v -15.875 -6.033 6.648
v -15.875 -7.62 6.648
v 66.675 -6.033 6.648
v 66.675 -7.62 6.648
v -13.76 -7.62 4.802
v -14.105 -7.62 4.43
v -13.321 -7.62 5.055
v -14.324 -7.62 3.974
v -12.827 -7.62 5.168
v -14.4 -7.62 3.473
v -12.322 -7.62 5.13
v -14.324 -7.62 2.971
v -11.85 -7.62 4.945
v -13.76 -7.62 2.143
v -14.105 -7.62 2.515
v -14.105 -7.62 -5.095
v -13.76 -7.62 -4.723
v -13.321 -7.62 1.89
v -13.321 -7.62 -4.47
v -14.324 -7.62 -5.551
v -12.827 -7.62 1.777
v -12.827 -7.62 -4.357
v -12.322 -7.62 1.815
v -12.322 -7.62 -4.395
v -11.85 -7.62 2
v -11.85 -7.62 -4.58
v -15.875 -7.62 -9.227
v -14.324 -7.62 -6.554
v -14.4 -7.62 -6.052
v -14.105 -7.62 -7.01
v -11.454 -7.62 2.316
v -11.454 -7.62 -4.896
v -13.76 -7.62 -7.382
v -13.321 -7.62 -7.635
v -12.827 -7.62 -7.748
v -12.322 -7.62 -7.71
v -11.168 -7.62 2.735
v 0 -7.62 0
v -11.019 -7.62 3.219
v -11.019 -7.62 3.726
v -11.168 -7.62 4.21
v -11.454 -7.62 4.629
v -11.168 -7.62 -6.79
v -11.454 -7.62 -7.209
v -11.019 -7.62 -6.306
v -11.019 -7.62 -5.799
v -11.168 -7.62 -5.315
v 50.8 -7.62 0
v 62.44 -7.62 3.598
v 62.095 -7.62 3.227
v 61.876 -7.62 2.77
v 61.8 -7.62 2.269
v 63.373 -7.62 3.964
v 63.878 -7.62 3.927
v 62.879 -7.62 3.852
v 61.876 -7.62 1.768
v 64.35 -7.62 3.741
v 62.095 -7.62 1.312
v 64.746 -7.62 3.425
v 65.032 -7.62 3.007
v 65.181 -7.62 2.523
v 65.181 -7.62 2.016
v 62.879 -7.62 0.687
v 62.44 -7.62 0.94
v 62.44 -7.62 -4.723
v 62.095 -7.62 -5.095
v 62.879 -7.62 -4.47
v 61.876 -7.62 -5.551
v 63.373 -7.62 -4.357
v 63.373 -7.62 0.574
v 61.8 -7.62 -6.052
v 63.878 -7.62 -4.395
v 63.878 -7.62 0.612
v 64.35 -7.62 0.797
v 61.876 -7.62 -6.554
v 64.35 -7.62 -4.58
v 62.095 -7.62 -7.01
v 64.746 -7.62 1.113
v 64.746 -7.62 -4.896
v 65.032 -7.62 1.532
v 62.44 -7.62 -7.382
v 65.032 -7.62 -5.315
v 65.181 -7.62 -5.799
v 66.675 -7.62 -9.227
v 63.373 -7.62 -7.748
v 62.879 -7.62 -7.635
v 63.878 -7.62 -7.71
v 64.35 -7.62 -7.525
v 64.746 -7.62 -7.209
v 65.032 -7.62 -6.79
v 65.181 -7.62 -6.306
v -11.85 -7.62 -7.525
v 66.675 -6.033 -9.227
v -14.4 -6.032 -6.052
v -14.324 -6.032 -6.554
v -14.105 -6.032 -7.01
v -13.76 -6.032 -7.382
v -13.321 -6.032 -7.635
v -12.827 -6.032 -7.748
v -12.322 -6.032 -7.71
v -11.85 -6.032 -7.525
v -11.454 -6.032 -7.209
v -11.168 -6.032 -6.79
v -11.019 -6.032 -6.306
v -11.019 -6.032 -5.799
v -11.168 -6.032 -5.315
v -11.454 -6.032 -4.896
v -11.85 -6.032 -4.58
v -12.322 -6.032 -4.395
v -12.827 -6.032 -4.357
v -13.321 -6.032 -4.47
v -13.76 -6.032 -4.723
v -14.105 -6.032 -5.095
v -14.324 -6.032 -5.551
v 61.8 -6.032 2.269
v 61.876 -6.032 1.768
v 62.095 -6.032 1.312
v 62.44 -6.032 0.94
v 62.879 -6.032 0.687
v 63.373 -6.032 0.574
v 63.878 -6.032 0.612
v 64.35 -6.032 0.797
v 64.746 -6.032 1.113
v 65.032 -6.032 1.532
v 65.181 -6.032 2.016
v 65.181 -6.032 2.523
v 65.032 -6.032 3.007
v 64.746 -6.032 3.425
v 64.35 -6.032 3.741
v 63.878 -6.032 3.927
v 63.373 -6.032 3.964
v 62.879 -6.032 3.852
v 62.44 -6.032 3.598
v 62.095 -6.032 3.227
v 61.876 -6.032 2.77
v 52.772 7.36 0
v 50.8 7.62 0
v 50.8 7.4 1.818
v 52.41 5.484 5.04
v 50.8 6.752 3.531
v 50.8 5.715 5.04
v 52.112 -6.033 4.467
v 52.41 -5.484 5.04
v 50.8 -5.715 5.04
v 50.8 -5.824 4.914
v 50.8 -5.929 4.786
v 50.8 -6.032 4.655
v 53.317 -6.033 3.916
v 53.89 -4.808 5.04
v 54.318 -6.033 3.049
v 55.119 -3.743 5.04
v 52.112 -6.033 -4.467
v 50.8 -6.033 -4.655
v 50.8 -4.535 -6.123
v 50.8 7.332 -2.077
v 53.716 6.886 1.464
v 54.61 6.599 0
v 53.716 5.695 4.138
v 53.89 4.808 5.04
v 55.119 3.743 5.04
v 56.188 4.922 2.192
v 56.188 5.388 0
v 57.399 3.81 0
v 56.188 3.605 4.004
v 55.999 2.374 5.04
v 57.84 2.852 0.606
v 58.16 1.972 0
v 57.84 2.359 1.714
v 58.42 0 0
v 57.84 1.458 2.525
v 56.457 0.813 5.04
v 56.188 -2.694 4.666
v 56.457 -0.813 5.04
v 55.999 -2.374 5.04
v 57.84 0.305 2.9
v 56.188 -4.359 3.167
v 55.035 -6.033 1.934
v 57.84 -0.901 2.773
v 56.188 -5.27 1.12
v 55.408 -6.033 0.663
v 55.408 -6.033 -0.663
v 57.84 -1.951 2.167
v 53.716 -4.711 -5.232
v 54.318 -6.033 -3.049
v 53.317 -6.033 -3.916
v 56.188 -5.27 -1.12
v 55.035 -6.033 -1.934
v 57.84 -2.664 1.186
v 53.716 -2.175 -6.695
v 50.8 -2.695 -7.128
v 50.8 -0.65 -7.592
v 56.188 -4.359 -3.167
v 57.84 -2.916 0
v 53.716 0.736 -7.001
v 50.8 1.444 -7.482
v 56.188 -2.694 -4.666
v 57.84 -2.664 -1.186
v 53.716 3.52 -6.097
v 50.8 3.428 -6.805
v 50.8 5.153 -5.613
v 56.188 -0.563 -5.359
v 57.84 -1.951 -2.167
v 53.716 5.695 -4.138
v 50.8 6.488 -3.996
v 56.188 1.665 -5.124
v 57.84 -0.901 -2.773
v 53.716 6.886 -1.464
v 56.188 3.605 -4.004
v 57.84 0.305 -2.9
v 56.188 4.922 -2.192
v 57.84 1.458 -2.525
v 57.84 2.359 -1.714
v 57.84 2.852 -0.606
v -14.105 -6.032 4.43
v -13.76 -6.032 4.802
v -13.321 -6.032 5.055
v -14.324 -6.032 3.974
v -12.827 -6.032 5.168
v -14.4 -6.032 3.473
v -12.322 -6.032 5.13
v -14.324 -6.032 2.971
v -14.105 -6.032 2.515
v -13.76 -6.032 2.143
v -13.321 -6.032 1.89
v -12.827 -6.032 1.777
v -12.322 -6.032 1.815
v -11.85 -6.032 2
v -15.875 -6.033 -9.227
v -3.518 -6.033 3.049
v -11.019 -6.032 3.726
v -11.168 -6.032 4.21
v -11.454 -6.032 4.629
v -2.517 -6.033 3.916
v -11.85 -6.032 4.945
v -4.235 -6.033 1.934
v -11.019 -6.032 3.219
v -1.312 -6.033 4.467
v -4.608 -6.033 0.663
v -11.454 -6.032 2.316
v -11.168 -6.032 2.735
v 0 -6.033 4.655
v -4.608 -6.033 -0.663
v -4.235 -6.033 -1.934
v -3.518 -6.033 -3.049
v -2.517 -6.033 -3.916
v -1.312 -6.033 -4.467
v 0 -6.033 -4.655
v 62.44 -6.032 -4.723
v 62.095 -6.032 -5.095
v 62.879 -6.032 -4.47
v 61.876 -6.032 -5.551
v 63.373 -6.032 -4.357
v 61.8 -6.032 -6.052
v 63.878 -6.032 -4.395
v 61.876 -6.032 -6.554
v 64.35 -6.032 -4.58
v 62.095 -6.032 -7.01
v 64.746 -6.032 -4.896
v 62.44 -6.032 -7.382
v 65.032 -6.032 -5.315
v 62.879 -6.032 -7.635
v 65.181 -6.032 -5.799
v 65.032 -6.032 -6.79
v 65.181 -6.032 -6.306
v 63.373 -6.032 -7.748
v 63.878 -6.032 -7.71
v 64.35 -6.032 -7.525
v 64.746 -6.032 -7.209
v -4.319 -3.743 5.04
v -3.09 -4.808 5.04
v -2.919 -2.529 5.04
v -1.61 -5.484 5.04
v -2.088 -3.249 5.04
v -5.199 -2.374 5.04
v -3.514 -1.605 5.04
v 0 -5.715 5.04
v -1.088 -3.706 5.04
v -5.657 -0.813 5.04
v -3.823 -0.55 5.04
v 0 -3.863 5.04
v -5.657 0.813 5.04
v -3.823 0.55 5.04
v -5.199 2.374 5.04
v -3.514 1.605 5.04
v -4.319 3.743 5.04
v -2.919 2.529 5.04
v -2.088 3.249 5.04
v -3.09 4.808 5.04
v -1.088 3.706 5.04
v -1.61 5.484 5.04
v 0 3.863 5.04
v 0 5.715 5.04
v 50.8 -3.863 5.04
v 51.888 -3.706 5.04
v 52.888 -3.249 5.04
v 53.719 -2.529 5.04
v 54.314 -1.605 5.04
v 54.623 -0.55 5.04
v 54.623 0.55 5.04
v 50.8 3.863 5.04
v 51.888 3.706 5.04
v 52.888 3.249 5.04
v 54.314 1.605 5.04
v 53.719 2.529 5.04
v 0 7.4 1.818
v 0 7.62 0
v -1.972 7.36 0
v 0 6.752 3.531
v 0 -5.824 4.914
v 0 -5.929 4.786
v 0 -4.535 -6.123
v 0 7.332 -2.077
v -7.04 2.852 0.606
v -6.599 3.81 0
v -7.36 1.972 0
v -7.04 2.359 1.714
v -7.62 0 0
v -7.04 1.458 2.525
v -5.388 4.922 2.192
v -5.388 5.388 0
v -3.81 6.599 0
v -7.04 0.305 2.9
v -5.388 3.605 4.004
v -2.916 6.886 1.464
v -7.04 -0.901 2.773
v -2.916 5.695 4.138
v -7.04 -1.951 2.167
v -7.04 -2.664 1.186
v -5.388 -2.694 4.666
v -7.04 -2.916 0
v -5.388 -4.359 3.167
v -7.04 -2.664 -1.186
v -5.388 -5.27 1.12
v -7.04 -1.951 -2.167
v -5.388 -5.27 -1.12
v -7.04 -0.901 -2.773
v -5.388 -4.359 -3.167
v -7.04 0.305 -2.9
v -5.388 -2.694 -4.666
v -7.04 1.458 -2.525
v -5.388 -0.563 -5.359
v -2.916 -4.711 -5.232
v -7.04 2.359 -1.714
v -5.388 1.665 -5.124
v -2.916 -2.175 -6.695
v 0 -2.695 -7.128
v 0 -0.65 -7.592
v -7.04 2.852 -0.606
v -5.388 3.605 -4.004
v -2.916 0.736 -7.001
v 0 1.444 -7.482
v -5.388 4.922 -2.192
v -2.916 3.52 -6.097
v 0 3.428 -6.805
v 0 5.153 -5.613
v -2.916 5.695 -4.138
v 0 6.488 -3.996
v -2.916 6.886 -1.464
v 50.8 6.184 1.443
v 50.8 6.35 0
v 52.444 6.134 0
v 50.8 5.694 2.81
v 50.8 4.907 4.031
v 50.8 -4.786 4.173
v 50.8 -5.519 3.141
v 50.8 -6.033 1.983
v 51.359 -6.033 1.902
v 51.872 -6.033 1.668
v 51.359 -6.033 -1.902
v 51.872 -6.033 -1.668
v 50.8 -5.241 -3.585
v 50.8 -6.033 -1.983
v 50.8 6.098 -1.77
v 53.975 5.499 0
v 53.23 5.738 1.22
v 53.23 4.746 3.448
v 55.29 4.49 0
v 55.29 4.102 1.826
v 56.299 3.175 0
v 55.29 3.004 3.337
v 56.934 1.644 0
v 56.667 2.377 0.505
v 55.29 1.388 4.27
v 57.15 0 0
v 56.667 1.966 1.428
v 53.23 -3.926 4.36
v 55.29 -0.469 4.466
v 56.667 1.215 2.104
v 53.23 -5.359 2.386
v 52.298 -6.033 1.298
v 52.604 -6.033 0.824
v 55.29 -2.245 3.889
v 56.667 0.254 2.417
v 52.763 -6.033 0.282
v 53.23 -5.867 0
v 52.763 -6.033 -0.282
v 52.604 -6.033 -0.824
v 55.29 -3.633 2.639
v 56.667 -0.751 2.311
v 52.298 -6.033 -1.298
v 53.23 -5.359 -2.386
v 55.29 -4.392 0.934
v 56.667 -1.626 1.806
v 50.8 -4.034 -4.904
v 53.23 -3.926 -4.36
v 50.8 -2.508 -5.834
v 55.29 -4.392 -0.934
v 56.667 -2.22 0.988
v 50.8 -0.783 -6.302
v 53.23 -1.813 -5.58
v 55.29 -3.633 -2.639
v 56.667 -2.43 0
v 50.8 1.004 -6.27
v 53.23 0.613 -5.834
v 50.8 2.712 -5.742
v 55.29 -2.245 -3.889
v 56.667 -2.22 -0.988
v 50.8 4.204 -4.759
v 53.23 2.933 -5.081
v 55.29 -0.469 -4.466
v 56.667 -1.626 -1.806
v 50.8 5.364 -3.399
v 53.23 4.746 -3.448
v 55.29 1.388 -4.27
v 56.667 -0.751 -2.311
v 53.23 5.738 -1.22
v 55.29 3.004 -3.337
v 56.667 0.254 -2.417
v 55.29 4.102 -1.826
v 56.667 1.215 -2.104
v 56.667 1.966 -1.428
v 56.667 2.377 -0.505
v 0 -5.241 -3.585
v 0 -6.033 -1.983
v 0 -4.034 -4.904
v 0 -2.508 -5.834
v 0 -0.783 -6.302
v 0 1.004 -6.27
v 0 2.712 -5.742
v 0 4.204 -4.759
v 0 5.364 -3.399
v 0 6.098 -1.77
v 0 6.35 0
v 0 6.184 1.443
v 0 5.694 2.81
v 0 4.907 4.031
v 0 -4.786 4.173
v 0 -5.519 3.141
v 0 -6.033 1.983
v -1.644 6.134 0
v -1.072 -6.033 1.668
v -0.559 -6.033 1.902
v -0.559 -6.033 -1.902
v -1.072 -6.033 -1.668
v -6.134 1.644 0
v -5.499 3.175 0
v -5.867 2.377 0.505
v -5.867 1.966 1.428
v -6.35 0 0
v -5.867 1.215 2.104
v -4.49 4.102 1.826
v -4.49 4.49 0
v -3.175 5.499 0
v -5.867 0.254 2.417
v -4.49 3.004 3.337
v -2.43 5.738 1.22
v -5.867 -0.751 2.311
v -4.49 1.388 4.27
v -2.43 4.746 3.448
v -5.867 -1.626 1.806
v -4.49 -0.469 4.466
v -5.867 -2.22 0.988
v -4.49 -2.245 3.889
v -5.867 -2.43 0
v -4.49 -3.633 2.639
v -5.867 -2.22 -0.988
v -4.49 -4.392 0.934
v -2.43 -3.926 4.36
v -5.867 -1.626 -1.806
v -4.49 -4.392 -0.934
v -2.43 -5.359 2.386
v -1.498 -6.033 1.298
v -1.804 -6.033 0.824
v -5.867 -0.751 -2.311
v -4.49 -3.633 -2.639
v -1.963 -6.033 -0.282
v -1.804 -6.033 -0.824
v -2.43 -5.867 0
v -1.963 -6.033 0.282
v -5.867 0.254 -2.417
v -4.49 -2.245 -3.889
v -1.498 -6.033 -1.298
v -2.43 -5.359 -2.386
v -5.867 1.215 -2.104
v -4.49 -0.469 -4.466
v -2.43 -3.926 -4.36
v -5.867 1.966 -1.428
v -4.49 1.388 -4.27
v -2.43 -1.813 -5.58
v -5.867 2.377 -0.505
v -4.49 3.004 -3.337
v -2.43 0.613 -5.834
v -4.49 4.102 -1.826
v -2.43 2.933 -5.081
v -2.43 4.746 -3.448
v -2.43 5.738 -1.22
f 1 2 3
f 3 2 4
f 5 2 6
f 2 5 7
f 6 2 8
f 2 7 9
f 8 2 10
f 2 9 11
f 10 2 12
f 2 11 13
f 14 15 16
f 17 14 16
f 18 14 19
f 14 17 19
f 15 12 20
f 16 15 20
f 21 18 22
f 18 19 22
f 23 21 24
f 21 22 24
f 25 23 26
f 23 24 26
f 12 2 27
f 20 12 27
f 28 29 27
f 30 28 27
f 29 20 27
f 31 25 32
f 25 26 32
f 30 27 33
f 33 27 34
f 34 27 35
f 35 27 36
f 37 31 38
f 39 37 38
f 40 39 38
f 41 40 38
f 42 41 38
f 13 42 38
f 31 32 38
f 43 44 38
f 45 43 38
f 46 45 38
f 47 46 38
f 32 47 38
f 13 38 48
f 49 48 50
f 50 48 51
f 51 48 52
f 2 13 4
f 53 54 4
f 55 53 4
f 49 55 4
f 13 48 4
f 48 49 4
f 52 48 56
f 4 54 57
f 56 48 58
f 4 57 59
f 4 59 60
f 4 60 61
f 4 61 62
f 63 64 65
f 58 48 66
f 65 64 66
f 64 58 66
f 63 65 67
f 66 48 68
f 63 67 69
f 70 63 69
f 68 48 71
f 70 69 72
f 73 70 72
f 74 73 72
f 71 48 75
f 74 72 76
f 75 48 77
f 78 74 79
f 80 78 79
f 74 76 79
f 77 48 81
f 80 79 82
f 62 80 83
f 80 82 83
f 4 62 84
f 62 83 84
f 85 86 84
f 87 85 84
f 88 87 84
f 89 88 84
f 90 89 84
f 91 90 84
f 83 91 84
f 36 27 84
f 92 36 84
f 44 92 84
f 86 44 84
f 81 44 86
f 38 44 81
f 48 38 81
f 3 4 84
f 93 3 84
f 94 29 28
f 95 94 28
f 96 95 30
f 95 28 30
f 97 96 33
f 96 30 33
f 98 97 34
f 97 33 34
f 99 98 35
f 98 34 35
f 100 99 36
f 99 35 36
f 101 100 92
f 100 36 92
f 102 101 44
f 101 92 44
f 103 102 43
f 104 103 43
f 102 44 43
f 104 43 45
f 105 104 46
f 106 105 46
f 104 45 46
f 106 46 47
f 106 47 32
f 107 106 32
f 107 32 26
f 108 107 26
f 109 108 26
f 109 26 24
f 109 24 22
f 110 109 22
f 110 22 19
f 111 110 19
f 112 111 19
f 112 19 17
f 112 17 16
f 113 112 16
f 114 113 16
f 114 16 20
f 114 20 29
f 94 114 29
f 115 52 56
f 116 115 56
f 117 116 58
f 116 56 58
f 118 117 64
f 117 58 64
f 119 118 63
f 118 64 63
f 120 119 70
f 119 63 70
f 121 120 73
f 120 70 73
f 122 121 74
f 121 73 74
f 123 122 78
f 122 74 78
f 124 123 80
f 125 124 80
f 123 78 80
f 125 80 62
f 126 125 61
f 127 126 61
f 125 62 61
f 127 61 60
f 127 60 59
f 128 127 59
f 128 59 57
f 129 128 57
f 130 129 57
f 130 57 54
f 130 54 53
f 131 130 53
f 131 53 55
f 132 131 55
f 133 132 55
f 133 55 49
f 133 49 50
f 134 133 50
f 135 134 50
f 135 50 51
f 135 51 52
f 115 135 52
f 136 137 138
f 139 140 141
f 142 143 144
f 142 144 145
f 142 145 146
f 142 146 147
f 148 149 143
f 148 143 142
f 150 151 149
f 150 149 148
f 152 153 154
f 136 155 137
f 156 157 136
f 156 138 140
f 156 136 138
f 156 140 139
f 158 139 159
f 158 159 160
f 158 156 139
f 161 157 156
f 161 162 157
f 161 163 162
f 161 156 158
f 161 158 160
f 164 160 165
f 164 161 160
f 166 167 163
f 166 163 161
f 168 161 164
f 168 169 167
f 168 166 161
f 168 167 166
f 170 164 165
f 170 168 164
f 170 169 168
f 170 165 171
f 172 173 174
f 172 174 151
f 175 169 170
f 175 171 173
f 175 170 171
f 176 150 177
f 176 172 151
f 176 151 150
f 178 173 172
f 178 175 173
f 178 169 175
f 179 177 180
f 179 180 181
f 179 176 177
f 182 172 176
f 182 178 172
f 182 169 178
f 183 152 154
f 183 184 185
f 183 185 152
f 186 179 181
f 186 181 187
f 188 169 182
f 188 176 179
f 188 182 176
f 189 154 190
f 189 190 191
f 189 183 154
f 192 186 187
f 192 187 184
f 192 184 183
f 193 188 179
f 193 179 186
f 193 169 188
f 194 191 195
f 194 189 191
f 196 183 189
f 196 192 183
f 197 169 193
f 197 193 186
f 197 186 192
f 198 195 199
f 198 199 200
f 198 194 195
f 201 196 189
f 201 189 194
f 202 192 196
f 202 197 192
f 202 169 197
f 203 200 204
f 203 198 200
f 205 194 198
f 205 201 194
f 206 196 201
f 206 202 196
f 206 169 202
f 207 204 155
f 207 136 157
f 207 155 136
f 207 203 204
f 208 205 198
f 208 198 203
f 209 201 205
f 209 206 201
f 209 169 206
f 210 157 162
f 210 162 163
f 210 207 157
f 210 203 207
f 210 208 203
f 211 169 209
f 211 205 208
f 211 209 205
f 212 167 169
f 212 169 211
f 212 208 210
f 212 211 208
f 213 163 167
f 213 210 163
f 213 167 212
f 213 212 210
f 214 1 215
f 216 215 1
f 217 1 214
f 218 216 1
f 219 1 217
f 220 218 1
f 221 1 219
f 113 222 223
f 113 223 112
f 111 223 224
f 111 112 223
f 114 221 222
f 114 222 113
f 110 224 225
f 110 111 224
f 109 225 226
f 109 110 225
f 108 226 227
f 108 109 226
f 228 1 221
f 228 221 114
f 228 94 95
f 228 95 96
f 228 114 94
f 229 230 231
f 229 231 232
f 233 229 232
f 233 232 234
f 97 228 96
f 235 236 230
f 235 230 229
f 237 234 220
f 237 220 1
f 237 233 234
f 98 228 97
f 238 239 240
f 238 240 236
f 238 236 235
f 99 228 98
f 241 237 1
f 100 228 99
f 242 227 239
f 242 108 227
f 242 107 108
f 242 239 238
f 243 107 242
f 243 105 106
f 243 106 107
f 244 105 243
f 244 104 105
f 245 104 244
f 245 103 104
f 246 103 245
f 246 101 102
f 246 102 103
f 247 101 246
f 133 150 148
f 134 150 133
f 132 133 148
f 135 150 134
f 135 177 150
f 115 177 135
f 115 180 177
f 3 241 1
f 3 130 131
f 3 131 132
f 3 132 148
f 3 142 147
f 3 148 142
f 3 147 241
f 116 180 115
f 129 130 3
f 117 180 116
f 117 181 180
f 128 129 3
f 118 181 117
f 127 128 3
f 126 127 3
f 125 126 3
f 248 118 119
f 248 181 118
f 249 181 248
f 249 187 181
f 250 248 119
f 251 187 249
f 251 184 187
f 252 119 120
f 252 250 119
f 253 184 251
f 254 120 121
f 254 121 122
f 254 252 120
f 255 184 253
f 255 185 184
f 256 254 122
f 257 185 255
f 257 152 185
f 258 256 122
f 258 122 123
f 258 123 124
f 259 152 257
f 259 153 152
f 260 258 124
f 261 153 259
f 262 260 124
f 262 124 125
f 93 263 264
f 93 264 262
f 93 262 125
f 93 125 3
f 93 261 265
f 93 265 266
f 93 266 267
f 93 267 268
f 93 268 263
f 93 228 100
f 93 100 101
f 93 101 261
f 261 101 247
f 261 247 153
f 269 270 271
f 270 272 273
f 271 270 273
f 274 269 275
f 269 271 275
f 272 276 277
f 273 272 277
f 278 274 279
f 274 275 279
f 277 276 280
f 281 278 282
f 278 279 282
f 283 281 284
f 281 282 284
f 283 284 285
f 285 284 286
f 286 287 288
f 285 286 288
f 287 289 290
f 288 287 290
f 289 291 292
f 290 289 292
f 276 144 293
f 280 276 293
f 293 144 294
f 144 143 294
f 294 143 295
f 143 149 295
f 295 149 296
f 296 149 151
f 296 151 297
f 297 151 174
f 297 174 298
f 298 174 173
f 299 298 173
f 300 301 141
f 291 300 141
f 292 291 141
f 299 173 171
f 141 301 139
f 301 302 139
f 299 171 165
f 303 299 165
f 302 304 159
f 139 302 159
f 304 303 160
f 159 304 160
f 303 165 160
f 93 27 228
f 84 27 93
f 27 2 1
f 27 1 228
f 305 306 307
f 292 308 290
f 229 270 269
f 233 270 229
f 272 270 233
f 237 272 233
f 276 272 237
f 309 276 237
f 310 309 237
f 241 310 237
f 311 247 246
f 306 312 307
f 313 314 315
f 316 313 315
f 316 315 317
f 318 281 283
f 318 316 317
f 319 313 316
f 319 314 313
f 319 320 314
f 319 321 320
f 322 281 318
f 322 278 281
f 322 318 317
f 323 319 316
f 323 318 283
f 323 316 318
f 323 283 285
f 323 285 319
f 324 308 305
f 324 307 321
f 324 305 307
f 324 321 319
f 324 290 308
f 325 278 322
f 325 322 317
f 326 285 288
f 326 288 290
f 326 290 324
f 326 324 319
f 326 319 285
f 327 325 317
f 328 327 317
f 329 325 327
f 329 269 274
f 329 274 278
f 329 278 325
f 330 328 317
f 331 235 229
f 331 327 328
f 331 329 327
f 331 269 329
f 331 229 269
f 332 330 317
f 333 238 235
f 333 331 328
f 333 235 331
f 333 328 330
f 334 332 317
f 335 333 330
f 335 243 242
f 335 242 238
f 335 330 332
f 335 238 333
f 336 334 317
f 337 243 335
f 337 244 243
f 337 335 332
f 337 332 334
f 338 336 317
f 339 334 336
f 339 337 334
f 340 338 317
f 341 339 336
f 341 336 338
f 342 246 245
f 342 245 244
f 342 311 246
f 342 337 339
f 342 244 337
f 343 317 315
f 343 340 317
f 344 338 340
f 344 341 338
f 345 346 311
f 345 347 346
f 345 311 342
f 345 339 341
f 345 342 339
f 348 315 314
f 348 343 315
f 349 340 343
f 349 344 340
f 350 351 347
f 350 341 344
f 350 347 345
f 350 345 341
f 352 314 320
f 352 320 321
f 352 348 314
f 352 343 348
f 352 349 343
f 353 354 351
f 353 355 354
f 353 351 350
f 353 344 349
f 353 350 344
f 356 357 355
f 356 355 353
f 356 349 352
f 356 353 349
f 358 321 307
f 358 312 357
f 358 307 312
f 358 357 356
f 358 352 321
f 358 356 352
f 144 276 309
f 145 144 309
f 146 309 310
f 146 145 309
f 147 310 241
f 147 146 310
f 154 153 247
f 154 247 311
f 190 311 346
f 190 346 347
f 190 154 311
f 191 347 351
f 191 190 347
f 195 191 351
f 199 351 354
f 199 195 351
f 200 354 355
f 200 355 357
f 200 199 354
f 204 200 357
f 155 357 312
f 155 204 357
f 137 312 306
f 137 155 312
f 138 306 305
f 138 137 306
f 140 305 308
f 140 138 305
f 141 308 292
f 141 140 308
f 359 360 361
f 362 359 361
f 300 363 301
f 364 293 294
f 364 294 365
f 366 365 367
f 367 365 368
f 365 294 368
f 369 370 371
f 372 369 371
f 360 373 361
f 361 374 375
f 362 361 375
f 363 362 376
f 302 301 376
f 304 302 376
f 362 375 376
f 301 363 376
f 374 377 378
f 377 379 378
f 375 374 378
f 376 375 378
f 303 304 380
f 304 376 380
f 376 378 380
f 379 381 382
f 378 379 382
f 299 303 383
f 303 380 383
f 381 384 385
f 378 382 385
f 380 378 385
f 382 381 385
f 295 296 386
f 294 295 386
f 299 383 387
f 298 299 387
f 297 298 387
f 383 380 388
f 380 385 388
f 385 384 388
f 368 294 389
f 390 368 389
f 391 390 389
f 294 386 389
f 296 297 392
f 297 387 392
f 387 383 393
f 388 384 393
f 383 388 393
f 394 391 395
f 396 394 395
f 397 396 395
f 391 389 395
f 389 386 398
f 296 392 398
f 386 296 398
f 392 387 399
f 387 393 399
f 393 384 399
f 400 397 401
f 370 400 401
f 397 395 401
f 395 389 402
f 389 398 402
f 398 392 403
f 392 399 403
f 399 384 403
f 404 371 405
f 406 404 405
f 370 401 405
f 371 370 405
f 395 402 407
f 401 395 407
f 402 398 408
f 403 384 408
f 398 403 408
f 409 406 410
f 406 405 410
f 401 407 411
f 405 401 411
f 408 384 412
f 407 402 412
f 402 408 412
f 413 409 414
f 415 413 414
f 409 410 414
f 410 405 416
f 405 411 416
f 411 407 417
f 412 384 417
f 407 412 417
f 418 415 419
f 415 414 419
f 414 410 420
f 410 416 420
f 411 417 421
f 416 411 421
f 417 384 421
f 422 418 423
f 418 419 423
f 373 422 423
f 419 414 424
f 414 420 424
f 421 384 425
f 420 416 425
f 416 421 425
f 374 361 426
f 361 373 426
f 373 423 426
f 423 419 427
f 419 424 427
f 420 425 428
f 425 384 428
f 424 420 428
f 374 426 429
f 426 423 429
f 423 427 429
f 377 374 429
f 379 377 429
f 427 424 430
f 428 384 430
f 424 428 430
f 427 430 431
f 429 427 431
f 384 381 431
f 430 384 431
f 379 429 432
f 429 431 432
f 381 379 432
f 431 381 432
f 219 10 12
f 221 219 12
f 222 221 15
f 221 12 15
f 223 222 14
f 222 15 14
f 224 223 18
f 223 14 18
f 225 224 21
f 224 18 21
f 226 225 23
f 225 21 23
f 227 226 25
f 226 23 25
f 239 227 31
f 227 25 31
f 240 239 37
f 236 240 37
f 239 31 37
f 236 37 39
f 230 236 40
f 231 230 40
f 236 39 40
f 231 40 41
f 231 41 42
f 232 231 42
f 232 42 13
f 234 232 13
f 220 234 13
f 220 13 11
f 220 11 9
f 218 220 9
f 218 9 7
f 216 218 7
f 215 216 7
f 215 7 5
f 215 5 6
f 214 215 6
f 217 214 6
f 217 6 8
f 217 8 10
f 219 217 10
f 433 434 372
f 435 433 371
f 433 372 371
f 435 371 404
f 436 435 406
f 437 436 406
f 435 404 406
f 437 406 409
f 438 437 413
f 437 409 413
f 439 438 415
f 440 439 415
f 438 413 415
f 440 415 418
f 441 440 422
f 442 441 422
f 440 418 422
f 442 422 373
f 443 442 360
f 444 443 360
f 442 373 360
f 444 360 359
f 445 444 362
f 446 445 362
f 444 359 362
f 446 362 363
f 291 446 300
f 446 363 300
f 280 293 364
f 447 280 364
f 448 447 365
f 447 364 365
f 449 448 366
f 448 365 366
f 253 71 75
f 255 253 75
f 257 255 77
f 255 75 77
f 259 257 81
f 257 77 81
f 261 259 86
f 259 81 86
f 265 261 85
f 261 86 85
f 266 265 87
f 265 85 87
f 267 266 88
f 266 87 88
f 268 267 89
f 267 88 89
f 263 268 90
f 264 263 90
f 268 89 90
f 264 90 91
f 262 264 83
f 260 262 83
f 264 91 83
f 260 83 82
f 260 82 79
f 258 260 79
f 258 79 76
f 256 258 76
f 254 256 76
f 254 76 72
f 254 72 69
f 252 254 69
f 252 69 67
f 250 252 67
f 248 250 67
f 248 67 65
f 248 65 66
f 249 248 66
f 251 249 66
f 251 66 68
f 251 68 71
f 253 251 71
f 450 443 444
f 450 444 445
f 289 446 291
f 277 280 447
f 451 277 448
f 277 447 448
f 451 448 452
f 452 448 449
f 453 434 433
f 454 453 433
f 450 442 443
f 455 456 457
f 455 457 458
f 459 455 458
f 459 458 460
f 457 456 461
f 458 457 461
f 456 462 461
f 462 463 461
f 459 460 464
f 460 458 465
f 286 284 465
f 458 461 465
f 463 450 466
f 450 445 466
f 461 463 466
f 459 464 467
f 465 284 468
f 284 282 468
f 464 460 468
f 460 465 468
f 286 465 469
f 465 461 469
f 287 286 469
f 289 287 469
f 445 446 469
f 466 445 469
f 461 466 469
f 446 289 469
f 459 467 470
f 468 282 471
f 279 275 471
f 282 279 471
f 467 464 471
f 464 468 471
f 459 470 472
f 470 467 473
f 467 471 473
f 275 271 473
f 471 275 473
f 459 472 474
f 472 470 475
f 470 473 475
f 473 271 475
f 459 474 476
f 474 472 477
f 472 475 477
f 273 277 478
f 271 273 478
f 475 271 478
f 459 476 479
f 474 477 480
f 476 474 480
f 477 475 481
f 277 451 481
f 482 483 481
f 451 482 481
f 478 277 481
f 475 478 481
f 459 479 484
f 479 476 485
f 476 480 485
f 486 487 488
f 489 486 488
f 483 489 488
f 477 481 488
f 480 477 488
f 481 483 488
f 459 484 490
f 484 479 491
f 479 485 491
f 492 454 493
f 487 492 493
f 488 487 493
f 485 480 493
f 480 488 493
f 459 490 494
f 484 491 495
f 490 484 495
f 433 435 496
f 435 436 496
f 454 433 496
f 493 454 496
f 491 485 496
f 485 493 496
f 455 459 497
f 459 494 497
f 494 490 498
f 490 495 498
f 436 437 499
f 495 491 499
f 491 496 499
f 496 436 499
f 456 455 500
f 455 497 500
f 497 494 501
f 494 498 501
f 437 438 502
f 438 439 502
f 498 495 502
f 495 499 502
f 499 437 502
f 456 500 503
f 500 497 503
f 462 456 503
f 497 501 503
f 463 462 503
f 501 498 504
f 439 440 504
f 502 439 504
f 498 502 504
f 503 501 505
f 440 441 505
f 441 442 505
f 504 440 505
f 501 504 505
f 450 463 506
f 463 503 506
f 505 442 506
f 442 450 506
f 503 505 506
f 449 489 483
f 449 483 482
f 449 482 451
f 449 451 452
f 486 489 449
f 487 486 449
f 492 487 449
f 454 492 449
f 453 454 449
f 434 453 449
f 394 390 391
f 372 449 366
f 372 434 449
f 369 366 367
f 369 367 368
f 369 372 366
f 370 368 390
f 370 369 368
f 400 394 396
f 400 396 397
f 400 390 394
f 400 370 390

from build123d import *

# Parameters (mm, degrees)
SKETCH2_W            = 5.08
SKETCH2_H            = 11.43
CUT_EXTRUDE1_DEPTH   = 76.2
SKETCH3_W            = 82.55
SKETCH3_H            = 15.875
BOSS_EXTRUDE1_DEPTH  = 1.5875
M3_CLEARANCE_HOLE1_D = 3.4


# Read off the part's stored shape, not the designer's step: Shell1
with BuildPart() as part:
    # Sketch1 → Revolve1 (revolve)
    with BuildSketch(Plane.XY):
        with BuildLine():
            Line((0, 7.62), (50.8, 7.62))
            ThreePointArc((50.8, 7.62), (56.188153673, 5.388153673), (58.42, 0))
            Line((58.42, 0), (-7.62, 0))
            ThreePointArc((-7.62, 0), (-5.388153673, 5.388153673), (0, 7.62))
        make_face()
    revolve(axis=Axis((0, 0, 0), (1, 0, 0)))

    # Sketch2 → Cut-Extrude1 (cut, symmetric)
    with BuildSketch(Plane(origin=(0, 0, 0), x_dir=(0, 0, -1), z_dir=(1, 0, 0))):
        with Locations((-7.580156248, 0)):
            Rectangle(SKETCH2_W, SKETCH2_H)
    extrude(amount=CUT_EXTRUDE1_DEPTH, both=True, mode=Mode.SUBTRACT)

    # Shell1 outline → Shell1 (revolve, cut)
    with BuildSketch(Plane.YX):
        with BuildLine():
            Line((0, 57.15), (0, -6.35))
            ThreePointArc((0, -6.35), (4.490128063, -4.490128058), (6.35, 6e-09))
            Line((6.35, 6e-09), (6.35, 50.799999994))
            ThreePointArc((6.35, 50.799999994), (4.490128063, 55.290128058), (0, 57.15))
        make_face()
    revolve(axis=Axis((0, 0, 0), (1, 0, 0)), mode=Mode.SUBTRACT)

    # Sketch3 → Boss-Extrude1 (add)
    with BuildSketch(Plane(origin=(0, -7.62, 0), x_dir=(1, 0, 0), z_dir=(0, 1, 0))):
        with Locations((25.4, 1.289921876)):
            Rectangle(SKETCH3_W, SKETCH3_H)
    extrude(amount=BOSS_EXTRUDE1_DEPTH)

    # M3 Clearance Hole1 (through all)
    with Locations(Plane(origin=(0, -6.0325, 0), x_dir=(1, 0, 0), z_dir=(0, 1, 0))):
        with Locations((-12.7, 6.052421876), (-12.7, -3.472578124), (63.5, 6.052421876), (63.5, -2.26916829)):
            Hole(M3_CLEARANCE_HOLE1_D / 2)


solid = part.part
